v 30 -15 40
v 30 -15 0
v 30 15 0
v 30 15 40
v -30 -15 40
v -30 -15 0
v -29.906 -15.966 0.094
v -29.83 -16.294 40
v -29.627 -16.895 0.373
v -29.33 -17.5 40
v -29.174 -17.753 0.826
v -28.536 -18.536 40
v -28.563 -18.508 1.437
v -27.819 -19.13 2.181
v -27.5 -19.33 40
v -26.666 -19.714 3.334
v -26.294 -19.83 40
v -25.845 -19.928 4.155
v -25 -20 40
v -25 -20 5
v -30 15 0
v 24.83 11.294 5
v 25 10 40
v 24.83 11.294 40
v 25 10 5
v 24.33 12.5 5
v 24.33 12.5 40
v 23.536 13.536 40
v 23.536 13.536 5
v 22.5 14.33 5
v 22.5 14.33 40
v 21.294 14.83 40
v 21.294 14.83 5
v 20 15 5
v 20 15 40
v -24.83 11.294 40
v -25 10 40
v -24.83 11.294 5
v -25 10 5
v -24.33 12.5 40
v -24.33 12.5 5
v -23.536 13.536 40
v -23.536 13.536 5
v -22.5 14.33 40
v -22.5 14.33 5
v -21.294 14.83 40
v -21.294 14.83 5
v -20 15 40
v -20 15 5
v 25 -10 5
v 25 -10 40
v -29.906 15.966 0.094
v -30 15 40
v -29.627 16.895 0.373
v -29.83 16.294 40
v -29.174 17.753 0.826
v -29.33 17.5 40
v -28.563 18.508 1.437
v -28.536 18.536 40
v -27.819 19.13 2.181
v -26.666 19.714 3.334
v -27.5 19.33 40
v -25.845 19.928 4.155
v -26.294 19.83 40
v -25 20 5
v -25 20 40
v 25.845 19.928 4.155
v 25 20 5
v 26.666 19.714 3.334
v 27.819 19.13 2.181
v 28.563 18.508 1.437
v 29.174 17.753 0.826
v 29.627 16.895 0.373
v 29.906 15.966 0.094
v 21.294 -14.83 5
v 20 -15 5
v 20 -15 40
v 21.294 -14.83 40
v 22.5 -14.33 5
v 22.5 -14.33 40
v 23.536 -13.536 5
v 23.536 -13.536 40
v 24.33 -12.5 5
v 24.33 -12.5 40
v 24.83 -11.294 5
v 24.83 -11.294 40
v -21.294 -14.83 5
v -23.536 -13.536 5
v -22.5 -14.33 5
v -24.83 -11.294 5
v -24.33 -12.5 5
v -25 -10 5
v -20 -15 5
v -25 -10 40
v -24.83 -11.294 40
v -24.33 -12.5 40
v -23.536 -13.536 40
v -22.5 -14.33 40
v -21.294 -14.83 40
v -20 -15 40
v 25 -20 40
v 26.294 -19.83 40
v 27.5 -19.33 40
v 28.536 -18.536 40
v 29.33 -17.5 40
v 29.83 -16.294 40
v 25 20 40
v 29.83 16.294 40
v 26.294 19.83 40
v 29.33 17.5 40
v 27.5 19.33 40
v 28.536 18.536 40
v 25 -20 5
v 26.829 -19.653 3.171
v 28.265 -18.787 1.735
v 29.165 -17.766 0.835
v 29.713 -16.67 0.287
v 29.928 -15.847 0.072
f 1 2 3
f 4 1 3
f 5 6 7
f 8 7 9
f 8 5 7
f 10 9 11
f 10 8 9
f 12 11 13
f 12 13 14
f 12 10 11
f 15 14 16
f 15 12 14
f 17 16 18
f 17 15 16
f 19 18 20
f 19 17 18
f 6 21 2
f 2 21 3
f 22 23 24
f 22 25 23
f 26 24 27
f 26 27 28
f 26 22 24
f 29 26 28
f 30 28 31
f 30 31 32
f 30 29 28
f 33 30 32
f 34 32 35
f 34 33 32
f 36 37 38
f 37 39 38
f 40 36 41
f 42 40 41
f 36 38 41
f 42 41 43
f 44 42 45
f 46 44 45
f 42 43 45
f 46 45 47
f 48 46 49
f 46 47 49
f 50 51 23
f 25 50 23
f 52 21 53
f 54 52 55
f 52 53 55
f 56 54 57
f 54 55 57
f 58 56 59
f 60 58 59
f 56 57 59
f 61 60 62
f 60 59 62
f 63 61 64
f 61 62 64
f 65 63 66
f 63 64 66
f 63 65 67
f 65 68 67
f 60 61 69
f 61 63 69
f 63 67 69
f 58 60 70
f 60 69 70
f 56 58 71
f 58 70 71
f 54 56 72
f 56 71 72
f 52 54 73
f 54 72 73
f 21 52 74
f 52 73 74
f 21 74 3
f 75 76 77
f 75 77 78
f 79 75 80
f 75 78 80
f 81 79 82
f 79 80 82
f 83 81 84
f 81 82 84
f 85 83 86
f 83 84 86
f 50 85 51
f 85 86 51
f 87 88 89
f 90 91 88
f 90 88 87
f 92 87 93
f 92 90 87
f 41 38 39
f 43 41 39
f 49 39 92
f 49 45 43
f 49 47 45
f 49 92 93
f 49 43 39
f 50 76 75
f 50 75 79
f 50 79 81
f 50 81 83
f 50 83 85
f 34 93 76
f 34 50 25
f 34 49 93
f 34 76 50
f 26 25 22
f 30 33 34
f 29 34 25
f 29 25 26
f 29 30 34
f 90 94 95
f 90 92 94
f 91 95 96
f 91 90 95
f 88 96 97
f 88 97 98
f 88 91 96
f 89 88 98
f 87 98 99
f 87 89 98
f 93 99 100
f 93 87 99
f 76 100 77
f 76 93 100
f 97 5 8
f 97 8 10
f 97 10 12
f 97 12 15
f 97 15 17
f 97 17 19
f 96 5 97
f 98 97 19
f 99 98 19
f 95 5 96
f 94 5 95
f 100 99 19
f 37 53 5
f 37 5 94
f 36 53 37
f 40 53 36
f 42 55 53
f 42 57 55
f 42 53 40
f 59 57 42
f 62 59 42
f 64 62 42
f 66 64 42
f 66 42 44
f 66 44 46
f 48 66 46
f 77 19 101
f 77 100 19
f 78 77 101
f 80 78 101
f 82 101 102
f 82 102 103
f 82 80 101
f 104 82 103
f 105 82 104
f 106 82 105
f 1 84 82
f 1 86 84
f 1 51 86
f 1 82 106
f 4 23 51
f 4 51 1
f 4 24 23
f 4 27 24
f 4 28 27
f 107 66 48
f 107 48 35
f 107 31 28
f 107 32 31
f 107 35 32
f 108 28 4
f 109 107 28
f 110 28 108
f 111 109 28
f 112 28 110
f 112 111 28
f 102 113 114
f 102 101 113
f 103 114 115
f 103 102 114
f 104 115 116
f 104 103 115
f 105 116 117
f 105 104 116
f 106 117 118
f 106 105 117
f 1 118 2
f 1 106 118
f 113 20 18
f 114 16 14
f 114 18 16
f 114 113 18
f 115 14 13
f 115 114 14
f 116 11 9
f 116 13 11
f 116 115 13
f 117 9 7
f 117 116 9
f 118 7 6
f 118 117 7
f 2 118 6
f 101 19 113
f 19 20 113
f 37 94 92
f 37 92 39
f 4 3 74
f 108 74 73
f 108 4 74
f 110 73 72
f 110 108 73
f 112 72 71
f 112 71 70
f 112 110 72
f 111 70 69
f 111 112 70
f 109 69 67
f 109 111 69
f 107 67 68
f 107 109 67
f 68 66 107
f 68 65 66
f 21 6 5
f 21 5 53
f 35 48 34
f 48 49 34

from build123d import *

# Parameters (mm, degrees)
F0_W     = 60
F0_H     = 40
F1_DEPTH = 40
F2_T     = -5
F3_R     = 5


with BuildPart() as f1:
    # F0 (on Top) → F1 (new body)
    with BuildSketch(Plane.XY):
        Rectangle(F0_W, F0_H)
    extrude(amount=F1_DEPTH)

    # F2
    f2_openings = [f1.faces().sort_by_distance(p)[0] for p in [
        (0, 0, 40),
    ]]
    offset(amount=F2_T, openings=f2_openings)

    # F3
    f3_edges = [f1.edges().sort_by_distance(p)[0] for p in [
        (-30, 20, 20),
        (30, 20, 20),
        (-30, -20, 20),
        (30, -20, 20),
        (-25, -15, 22.5),
        (-25, 15, 22.5),
        (25, -15, 22.5),
        (25, 15, 22.5),
        (0, 20, 0),
        (0, -20, 0),
    ]]
    fillet(f3_edges, radius=F3_R)


solid = f1.part
